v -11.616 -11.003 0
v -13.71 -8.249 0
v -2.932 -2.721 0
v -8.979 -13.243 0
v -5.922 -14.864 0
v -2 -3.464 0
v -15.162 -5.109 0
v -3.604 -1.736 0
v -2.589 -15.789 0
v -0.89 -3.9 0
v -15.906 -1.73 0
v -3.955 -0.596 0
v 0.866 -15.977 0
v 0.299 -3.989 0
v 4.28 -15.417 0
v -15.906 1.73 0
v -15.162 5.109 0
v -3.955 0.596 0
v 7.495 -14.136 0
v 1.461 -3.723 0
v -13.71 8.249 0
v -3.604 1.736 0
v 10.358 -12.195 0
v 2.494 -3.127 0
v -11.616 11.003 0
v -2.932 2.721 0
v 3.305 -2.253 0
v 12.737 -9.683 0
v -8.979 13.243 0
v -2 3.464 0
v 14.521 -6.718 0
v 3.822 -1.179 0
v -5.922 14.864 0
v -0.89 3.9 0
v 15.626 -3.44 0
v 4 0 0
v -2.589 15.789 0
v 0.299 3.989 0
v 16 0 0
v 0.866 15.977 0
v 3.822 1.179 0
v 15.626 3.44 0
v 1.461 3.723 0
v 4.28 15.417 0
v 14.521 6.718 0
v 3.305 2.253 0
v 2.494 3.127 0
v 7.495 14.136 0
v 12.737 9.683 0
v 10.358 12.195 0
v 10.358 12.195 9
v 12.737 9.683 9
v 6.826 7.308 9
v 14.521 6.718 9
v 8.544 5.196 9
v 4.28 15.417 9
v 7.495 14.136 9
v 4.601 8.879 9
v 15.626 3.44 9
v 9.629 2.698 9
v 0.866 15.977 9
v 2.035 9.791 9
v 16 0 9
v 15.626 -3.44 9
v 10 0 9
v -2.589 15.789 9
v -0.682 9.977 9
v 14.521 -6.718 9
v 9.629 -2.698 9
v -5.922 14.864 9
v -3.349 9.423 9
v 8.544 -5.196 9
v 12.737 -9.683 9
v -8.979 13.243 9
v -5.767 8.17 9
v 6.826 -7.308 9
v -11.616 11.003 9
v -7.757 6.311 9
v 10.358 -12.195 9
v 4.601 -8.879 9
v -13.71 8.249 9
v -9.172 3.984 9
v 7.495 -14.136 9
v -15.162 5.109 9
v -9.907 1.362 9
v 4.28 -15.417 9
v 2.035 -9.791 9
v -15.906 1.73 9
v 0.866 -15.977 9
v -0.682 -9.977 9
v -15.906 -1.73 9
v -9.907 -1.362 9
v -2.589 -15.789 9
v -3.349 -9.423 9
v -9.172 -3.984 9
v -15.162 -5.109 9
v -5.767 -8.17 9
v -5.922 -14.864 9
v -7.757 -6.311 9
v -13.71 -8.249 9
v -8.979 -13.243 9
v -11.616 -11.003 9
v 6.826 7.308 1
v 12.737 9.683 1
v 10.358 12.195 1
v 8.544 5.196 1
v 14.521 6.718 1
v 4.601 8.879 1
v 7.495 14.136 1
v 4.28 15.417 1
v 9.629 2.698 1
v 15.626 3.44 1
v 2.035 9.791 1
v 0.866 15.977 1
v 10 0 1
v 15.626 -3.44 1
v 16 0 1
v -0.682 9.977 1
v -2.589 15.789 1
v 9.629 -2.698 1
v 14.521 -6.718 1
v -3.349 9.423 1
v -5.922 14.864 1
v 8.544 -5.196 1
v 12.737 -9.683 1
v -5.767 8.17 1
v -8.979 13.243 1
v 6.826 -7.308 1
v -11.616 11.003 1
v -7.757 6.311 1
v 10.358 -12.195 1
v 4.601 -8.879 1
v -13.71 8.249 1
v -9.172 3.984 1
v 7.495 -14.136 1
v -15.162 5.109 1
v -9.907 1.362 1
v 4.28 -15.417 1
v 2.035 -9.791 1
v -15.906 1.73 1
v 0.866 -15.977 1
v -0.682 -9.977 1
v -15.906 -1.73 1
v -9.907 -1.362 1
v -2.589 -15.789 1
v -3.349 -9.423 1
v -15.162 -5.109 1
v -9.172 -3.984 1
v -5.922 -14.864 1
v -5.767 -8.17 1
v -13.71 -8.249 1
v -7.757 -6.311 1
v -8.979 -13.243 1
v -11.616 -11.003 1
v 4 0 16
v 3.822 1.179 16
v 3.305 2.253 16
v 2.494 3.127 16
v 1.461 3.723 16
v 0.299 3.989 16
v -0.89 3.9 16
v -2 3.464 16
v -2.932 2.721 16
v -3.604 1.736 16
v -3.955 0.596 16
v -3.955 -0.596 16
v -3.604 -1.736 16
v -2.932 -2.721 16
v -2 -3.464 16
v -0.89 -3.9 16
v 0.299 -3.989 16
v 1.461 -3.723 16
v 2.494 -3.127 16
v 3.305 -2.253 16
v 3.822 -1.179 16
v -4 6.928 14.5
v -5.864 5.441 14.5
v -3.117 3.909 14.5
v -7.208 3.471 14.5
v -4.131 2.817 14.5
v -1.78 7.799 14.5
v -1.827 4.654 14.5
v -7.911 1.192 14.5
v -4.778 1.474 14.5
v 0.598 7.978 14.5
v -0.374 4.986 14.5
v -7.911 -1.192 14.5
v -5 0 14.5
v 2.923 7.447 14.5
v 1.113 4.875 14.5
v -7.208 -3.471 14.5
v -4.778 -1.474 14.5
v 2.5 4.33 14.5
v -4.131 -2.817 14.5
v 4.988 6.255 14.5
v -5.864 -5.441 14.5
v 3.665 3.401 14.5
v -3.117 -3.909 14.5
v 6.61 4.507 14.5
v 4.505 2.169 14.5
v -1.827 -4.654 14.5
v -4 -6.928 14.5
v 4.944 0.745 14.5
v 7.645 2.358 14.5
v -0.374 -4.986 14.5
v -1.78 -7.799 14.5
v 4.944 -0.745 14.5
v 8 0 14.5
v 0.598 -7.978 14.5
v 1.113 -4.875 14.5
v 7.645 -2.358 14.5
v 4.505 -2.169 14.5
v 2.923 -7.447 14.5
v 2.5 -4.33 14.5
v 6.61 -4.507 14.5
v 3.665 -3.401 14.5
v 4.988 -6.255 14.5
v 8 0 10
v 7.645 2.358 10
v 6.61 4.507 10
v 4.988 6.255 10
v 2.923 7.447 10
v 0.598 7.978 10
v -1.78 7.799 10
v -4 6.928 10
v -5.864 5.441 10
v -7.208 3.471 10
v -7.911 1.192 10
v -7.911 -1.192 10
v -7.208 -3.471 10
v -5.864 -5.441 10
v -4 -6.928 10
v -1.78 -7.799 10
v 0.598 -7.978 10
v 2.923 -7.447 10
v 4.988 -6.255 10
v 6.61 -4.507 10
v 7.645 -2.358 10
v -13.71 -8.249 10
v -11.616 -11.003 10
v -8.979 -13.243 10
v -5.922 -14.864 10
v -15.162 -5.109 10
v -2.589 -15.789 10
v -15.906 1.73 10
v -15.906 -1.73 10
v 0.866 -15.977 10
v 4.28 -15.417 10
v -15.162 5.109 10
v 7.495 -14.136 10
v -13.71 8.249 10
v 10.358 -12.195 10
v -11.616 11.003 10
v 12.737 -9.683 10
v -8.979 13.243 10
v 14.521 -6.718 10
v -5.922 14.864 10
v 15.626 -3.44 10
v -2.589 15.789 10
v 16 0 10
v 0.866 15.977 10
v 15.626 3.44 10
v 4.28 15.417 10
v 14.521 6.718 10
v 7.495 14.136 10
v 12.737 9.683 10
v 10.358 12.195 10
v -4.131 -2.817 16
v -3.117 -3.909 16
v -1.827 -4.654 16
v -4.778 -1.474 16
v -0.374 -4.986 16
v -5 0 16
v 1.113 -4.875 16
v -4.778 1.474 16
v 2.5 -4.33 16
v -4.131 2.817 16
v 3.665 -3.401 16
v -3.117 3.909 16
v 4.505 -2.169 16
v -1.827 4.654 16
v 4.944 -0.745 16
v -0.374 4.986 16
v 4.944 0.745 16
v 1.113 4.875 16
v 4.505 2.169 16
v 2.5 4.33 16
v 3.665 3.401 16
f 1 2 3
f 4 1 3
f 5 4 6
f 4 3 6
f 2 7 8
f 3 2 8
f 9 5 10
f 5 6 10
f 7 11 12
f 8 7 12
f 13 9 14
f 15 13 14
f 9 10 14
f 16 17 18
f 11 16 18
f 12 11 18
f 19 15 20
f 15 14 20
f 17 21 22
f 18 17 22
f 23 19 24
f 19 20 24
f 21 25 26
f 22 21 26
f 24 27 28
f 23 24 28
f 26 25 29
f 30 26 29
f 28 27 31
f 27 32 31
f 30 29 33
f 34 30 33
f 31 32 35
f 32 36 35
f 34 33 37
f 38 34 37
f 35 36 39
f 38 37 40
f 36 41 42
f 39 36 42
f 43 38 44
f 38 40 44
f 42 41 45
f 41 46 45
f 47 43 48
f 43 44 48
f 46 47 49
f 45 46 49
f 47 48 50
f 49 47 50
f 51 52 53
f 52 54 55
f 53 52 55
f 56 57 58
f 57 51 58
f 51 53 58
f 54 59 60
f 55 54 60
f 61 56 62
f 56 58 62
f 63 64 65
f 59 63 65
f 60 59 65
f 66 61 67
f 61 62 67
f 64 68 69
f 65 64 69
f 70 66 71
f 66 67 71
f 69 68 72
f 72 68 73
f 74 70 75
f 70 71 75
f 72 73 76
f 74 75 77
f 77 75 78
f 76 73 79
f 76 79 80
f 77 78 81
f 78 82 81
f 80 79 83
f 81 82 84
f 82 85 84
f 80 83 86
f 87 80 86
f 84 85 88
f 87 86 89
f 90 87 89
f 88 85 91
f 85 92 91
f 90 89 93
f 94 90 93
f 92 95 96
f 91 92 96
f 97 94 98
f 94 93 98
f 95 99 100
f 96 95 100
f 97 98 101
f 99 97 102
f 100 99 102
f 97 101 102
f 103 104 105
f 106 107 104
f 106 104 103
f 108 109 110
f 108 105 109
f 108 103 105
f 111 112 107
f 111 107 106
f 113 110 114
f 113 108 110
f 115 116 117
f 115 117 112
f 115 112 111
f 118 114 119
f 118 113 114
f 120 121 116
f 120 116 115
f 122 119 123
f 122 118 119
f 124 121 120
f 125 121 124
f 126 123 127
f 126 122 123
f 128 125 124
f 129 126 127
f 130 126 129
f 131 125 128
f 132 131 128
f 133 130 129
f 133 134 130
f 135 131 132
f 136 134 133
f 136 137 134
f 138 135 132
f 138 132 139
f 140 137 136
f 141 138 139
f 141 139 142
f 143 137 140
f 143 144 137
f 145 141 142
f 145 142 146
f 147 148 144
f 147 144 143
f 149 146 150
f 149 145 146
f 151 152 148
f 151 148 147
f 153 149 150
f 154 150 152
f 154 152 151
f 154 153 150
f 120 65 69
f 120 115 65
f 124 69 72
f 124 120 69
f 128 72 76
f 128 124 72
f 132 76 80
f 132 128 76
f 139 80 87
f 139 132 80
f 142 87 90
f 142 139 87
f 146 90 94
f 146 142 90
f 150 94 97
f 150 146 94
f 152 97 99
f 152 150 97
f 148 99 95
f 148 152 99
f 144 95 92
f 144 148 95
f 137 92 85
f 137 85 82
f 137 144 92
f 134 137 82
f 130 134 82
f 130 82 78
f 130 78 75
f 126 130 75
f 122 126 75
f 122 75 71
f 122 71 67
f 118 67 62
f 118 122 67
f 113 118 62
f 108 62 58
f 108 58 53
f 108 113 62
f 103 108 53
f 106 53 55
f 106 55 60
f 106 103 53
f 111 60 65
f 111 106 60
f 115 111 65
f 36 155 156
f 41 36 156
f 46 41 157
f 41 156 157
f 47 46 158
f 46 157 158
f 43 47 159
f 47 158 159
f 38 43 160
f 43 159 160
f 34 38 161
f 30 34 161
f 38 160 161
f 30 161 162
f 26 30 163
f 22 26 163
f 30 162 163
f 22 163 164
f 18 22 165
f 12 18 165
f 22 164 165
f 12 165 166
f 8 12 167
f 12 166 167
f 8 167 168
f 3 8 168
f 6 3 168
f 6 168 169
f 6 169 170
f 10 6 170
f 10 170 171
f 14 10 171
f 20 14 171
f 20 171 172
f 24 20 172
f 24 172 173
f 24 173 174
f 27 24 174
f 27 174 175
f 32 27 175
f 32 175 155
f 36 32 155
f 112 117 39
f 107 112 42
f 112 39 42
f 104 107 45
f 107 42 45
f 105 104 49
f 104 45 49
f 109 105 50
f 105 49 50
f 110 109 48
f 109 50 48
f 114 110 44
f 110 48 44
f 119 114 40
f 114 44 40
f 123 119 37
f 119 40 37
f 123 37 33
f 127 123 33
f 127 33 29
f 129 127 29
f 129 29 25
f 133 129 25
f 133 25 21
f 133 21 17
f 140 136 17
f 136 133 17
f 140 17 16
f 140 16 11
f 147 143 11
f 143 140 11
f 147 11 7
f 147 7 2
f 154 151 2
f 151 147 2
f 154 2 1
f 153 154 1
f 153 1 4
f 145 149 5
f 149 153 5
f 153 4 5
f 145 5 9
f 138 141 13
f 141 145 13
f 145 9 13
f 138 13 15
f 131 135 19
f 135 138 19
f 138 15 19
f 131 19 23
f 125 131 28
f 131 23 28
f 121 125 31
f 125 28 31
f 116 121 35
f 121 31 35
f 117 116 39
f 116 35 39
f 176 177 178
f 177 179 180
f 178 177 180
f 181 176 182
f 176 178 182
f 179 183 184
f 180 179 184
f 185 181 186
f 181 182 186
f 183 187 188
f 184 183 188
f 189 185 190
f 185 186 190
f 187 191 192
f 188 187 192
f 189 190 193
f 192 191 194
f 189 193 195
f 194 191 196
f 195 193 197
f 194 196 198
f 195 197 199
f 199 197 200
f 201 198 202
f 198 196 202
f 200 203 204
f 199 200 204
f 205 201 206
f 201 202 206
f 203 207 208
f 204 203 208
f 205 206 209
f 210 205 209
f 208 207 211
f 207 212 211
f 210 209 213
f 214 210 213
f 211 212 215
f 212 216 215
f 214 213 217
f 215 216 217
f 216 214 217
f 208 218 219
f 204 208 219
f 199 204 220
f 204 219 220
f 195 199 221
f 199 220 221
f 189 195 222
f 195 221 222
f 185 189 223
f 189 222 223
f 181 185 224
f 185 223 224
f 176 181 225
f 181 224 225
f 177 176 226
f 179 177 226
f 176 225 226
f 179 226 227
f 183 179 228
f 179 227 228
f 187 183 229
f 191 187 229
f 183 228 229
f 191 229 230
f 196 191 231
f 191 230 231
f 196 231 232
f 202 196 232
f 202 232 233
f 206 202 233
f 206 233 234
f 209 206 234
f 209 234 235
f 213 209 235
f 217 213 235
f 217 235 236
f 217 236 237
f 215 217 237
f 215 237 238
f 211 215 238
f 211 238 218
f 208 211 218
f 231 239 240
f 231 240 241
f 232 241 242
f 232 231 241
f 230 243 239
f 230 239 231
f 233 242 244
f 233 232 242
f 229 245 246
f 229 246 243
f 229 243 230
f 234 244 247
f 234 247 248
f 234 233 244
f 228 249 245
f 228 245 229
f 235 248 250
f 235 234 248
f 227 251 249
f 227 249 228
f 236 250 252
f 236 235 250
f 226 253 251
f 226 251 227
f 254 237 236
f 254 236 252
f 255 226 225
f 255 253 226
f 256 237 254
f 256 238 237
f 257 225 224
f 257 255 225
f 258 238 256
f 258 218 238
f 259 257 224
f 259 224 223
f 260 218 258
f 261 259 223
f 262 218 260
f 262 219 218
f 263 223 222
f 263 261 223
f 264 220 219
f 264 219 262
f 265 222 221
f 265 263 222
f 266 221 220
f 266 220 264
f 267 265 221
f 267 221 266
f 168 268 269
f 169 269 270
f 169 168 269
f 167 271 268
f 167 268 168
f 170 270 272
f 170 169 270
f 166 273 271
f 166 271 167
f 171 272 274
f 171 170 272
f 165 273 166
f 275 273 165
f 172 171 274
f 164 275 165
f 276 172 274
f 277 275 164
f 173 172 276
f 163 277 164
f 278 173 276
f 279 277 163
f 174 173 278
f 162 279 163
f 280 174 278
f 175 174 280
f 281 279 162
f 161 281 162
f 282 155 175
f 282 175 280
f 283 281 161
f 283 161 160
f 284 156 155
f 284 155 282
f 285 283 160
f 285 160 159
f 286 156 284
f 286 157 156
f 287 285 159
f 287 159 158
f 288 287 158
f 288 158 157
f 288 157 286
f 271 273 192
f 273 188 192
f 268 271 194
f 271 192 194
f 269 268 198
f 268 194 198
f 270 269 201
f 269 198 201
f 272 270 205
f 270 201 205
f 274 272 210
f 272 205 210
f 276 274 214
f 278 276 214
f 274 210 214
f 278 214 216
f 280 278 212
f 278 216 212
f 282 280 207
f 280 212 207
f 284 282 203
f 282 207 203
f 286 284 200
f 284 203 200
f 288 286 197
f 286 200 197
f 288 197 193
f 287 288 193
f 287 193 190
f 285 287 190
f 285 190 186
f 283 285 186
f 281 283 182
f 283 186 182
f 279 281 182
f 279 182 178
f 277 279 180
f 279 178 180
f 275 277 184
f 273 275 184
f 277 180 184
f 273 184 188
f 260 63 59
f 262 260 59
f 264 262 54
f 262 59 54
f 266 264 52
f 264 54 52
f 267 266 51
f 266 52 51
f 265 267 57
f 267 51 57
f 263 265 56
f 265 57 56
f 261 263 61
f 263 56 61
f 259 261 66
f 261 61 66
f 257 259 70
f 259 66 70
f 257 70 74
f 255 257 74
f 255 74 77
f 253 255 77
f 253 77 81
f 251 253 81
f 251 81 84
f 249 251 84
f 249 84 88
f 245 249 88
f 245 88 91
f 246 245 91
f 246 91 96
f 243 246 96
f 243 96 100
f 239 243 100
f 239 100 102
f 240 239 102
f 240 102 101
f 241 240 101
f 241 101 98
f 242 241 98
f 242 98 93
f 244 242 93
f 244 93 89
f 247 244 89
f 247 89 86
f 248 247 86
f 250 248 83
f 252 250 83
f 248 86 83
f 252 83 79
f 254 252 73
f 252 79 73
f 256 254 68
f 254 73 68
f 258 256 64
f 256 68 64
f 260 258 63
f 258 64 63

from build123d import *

# Parameters (mm, degrees)
ESQUISSE1_R             = 16
BOSS_EXTRU_1_DEPTH      = 10
ESQUISSE2_R             = 8
BOSS_EXTRU_2_DEPTH      = 6
ESQUISSE3_R             = 4
ENL_V_MAT_EXTRU_1_DEPTH = 28.712812921
ESQUISSE4_W             = 8
ESQUISSE4_H             = 6
ESQUISSE5_W             = 1.5
ESQUISSE5_H             = 3


with BuildPart() as part:
    # Esquisse1 → Boss.-Extru.1 (new body)
    with BuildSketch(Plane.XY):
        Circle(ESQUISSE1_R)
    extrude(amount=BOSS_EXTRU_1_DEPTH)

    # Esquisse2 → Boss.-Extru.2 (add)
    with BuildSketch(Plane.XY.offset(10)):
        Circle(ESQUISSE2_R)
    extrude(amount=BOSS_EXTRU_2_DEPTH)

    # Esquisse3 → Enlèv. mat.-Extru.1 (cut, through all)
    with BuildSketch(Plane.XY.offset(16)):
        Circle(ESQUISSE3_R)
    extrude(amount=-ENL_V_MAT_EXTRU_1_DEPTH, mode=Mode.SUBTRACT)

    # Esquisse4 → Enlèvement de matière-Révolution1 (revolve, cut)
    with BuildSketch(Plane(origin=(0, 0, 0), x_dir=(0, 0, -1), z_dir=(1, 0, 0)), mode=Mode.PRIVATE) as enl_vement_de_mati_re_r_volution1_sk:
        with Locations((-5, 13)):
            Rectangle(ESQUISSE4_W, ESQUISSE4_H)
    revolve(enl_vement_de_mati_re_r_volution1_sk.sketch.rotate(Axis((0, 0, 0), (0, 0, -1)), 90), axis=Axis((0, 0, 0), (0, 0, -1)), mode=Mode.SUBTRACT)

    # Esquisse5 → Enlèvement de matière-Révolution2 (revolve, cut)
    with BuildSketch(Plane(origin=(0, 0, 0), x_dir=(0, 0, -1), z_dir=(1, 0, 0)), mode=Mode.PRIVATE) as enl_vement_de_mati_re_r_volution2_sk:
        with Locations((-15.25, 6.5)):
            Rectangle(ESQUISSE5_W, ESQUISSE5_H)
    revolve(enl_vement_de_mati_re_r_volution2_sk.sketch.rotate(Axis((0, 0, 0), (0, 0, 1)), 90), axis=Axis((0, 0, 0), (0, 0, 1)), mode=Mode.SUBTRACT)


solid = part.part
